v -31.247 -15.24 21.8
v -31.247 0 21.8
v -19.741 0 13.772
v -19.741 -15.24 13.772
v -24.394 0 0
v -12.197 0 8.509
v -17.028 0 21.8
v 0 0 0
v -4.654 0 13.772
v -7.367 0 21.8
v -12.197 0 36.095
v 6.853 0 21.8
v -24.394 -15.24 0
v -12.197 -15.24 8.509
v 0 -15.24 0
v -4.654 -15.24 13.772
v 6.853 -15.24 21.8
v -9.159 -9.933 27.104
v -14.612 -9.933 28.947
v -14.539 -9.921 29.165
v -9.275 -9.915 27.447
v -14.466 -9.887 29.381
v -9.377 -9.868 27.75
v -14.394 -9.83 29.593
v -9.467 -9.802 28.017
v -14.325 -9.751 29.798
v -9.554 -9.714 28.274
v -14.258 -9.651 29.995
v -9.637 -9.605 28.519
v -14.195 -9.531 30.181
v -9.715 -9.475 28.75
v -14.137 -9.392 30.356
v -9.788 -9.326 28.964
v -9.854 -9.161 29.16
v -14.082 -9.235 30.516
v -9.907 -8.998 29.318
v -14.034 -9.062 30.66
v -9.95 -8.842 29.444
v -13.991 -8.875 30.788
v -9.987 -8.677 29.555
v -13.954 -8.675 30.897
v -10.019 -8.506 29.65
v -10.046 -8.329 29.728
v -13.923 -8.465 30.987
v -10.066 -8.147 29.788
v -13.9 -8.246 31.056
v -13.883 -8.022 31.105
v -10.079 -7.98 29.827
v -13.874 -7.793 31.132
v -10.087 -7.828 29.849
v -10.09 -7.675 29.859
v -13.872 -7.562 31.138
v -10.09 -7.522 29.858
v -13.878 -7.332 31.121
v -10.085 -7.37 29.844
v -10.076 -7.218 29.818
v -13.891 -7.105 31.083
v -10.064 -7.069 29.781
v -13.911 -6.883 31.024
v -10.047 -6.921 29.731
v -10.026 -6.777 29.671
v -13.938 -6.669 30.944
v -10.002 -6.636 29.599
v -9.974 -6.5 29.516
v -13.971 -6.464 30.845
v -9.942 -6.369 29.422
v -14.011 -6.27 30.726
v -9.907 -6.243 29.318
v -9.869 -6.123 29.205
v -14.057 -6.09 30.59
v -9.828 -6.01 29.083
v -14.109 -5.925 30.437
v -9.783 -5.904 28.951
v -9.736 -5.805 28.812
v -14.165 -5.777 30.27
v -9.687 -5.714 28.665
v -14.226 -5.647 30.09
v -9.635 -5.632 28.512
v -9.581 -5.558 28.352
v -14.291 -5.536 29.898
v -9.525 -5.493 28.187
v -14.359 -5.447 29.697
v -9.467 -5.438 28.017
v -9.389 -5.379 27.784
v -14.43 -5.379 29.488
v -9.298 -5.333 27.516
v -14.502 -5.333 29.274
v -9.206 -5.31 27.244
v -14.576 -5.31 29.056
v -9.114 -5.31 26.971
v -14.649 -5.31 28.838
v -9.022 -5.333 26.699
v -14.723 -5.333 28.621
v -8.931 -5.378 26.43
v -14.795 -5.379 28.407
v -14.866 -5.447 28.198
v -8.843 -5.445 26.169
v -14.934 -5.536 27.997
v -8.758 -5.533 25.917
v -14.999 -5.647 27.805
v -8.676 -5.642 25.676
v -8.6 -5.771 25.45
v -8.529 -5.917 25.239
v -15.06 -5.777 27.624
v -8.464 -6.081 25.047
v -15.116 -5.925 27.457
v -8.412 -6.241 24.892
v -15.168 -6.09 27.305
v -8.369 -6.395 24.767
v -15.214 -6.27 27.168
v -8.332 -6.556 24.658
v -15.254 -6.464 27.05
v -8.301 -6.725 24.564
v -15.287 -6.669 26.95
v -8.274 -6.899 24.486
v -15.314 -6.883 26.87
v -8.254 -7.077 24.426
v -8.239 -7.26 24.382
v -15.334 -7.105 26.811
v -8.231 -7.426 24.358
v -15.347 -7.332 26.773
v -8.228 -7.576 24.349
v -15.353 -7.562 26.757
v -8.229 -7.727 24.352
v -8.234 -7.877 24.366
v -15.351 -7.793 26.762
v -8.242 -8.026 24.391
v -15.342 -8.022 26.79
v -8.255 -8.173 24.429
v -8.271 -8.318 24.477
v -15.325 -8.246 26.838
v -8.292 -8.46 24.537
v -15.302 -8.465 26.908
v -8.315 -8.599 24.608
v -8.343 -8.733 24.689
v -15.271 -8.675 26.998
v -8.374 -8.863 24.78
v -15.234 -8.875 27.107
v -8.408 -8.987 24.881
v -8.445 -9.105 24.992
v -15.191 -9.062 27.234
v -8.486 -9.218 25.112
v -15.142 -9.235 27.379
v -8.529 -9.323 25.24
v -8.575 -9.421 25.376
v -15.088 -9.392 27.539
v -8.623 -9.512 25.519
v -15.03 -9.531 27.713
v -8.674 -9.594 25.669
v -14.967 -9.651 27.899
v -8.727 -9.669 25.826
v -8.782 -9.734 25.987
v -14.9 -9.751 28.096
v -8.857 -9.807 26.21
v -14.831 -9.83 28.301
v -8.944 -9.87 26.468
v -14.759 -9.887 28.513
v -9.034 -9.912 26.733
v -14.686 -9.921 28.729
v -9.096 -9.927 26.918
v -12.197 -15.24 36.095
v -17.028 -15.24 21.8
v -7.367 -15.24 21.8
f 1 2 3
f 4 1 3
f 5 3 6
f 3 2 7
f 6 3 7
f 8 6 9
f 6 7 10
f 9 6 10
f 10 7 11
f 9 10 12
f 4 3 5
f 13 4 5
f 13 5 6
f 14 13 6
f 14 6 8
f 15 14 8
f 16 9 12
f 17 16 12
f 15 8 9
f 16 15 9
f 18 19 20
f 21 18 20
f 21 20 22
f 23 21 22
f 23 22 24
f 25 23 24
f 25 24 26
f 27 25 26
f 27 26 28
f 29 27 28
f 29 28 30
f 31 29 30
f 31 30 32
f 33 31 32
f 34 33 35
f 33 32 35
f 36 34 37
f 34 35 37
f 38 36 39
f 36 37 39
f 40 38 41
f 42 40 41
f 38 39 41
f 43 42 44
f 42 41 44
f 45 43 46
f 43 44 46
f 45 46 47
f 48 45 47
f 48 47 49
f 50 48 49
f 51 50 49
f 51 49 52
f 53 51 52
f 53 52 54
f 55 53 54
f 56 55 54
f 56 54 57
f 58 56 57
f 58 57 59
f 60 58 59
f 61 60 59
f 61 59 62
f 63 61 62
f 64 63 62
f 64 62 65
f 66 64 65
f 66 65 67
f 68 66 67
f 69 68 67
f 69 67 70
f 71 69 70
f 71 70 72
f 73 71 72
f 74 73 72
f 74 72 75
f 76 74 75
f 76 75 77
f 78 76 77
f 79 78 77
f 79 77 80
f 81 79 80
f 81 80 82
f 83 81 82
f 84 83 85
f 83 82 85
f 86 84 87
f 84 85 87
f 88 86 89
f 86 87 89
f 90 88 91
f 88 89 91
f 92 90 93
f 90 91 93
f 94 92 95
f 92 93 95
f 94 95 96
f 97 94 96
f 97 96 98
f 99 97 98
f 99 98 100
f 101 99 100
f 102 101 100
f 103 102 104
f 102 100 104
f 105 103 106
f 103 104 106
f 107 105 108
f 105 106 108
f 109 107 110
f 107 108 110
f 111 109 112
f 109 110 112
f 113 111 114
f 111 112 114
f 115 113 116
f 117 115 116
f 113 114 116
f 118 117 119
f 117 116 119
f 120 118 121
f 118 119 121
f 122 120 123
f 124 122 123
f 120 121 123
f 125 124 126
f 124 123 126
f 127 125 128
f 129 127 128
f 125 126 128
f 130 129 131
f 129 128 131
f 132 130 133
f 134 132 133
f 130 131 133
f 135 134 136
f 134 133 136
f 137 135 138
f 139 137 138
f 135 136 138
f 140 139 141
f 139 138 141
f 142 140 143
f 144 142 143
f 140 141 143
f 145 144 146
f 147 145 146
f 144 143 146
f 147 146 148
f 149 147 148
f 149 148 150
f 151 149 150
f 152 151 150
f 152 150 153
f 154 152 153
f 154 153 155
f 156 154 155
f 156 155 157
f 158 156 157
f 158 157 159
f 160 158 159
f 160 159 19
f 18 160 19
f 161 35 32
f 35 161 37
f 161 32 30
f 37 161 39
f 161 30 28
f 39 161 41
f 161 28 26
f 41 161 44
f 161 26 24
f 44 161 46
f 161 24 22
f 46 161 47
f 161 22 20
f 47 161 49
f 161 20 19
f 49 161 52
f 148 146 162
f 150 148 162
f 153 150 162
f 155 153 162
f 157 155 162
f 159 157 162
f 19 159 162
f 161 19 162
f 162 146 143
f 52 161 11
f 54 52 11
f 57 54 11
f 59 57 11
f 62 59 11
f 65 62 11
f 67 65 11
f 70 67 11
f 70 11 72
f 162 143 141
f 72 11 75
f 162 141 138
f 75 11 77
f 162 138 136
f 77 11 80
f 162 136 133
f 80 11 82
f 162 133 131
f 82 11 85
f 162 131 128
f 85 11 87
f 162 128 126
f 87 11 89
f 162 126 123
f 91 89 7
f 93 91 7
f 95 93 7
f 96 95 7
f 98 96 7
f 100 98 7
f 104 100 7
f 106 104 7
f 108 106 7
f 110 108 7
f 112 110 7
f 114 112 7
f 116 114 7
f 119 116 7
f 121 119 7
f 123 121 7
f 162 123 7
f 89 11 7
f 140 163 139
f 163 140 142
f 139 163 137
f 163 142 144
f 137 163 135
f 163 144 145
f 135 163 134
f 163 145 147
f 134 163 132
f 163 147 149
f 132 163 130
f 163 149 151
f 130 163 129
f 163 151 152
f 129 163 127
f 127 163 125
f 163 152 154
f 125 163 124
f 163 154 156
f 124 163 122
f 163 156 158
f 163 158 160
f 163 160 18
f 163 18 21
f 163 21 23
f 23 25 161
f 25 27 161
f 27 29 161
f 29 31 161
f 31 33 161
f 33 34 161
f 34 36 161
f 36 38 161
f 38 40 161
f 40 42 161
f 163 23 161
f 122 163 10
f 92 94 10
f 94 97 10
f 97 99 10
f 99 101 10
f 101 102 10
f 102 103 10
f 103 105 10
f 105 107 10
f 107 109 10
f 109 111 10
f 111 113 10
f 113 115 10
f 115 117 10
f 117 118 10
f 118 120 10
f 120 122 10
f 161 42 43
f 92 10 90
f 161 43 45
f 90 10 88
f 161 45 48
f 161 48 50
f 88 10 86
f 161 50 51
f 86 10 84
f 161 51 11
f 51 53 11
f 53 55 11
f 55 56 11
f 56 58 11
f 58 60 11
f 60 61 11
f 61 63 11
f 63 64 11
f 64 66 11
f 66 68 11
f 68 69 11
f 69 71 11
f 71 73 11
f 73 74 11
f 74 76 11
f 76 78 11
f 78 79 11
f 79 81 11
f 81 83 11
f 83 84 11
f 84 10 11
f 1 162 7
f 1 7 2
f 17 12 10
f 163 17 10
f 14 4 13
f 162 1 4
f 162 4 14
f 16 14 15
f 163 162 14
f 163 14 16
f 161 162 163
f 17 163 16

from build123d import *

# Parameters (mm, degrees)
F1_DEPTH = 15.24
F3_R     = 2.312647279
F4_DEPTH = 10.6426


with BuildPart() as f1:
    # F0 (on Front) → F1 (new body)
    with BuildSketch(Plane.XZ):
        Polygon((-7.3665321659, 21.7996356664), (-12.1971740292, 36.0948603779), (-17.0278158926, 21.7996356664), align=None)
        Polygon((-7.3665321659, 21.7996356664), (-17.0278158926, 21.7996356664), (-19.7405148125, 13.7719984015), (-12.1971740292, 8.5093759118), (-4.6538332459, 13.7719984015), align=None)
        Polygon((-19.7405148125, 13.7719984015), (-17.0278158926, 21.7996356664), (-31.2471740292, 21.7996356664), align=None)
        Polygon((6.8528259708, 21.7996356664), (-7.3665321659, 21.7996356664), (-4.6538332459, 13.7719984015), align=None)
        Polygon((-12.1971740292, 8.5093759118), (-19.7405148125, 13.7719984015), (-24.3943480584, 0), align=None)
        Polygon((0, 0), (-4.6538332459, 13.7719984015), (-12.1971740292, 8.5093759118), align=None)
    extrude(amount=F1_DEPTH)

    # F3 (on face) → F4 (cut)
    with BuildSketch(Plane(origin=(-21.8942461856, 0, 7.3985029494), x_dir=(0, -1, 0), z_dir=(-0.9473716635, 0, 0.3201358013))):
        with Locations((7.62, 22.7458197282)):
            Circle(F3_R)
    extrude(amount=-F4_DEPTH, mode=Mode.SUBTRACT)


solid = f1.part
